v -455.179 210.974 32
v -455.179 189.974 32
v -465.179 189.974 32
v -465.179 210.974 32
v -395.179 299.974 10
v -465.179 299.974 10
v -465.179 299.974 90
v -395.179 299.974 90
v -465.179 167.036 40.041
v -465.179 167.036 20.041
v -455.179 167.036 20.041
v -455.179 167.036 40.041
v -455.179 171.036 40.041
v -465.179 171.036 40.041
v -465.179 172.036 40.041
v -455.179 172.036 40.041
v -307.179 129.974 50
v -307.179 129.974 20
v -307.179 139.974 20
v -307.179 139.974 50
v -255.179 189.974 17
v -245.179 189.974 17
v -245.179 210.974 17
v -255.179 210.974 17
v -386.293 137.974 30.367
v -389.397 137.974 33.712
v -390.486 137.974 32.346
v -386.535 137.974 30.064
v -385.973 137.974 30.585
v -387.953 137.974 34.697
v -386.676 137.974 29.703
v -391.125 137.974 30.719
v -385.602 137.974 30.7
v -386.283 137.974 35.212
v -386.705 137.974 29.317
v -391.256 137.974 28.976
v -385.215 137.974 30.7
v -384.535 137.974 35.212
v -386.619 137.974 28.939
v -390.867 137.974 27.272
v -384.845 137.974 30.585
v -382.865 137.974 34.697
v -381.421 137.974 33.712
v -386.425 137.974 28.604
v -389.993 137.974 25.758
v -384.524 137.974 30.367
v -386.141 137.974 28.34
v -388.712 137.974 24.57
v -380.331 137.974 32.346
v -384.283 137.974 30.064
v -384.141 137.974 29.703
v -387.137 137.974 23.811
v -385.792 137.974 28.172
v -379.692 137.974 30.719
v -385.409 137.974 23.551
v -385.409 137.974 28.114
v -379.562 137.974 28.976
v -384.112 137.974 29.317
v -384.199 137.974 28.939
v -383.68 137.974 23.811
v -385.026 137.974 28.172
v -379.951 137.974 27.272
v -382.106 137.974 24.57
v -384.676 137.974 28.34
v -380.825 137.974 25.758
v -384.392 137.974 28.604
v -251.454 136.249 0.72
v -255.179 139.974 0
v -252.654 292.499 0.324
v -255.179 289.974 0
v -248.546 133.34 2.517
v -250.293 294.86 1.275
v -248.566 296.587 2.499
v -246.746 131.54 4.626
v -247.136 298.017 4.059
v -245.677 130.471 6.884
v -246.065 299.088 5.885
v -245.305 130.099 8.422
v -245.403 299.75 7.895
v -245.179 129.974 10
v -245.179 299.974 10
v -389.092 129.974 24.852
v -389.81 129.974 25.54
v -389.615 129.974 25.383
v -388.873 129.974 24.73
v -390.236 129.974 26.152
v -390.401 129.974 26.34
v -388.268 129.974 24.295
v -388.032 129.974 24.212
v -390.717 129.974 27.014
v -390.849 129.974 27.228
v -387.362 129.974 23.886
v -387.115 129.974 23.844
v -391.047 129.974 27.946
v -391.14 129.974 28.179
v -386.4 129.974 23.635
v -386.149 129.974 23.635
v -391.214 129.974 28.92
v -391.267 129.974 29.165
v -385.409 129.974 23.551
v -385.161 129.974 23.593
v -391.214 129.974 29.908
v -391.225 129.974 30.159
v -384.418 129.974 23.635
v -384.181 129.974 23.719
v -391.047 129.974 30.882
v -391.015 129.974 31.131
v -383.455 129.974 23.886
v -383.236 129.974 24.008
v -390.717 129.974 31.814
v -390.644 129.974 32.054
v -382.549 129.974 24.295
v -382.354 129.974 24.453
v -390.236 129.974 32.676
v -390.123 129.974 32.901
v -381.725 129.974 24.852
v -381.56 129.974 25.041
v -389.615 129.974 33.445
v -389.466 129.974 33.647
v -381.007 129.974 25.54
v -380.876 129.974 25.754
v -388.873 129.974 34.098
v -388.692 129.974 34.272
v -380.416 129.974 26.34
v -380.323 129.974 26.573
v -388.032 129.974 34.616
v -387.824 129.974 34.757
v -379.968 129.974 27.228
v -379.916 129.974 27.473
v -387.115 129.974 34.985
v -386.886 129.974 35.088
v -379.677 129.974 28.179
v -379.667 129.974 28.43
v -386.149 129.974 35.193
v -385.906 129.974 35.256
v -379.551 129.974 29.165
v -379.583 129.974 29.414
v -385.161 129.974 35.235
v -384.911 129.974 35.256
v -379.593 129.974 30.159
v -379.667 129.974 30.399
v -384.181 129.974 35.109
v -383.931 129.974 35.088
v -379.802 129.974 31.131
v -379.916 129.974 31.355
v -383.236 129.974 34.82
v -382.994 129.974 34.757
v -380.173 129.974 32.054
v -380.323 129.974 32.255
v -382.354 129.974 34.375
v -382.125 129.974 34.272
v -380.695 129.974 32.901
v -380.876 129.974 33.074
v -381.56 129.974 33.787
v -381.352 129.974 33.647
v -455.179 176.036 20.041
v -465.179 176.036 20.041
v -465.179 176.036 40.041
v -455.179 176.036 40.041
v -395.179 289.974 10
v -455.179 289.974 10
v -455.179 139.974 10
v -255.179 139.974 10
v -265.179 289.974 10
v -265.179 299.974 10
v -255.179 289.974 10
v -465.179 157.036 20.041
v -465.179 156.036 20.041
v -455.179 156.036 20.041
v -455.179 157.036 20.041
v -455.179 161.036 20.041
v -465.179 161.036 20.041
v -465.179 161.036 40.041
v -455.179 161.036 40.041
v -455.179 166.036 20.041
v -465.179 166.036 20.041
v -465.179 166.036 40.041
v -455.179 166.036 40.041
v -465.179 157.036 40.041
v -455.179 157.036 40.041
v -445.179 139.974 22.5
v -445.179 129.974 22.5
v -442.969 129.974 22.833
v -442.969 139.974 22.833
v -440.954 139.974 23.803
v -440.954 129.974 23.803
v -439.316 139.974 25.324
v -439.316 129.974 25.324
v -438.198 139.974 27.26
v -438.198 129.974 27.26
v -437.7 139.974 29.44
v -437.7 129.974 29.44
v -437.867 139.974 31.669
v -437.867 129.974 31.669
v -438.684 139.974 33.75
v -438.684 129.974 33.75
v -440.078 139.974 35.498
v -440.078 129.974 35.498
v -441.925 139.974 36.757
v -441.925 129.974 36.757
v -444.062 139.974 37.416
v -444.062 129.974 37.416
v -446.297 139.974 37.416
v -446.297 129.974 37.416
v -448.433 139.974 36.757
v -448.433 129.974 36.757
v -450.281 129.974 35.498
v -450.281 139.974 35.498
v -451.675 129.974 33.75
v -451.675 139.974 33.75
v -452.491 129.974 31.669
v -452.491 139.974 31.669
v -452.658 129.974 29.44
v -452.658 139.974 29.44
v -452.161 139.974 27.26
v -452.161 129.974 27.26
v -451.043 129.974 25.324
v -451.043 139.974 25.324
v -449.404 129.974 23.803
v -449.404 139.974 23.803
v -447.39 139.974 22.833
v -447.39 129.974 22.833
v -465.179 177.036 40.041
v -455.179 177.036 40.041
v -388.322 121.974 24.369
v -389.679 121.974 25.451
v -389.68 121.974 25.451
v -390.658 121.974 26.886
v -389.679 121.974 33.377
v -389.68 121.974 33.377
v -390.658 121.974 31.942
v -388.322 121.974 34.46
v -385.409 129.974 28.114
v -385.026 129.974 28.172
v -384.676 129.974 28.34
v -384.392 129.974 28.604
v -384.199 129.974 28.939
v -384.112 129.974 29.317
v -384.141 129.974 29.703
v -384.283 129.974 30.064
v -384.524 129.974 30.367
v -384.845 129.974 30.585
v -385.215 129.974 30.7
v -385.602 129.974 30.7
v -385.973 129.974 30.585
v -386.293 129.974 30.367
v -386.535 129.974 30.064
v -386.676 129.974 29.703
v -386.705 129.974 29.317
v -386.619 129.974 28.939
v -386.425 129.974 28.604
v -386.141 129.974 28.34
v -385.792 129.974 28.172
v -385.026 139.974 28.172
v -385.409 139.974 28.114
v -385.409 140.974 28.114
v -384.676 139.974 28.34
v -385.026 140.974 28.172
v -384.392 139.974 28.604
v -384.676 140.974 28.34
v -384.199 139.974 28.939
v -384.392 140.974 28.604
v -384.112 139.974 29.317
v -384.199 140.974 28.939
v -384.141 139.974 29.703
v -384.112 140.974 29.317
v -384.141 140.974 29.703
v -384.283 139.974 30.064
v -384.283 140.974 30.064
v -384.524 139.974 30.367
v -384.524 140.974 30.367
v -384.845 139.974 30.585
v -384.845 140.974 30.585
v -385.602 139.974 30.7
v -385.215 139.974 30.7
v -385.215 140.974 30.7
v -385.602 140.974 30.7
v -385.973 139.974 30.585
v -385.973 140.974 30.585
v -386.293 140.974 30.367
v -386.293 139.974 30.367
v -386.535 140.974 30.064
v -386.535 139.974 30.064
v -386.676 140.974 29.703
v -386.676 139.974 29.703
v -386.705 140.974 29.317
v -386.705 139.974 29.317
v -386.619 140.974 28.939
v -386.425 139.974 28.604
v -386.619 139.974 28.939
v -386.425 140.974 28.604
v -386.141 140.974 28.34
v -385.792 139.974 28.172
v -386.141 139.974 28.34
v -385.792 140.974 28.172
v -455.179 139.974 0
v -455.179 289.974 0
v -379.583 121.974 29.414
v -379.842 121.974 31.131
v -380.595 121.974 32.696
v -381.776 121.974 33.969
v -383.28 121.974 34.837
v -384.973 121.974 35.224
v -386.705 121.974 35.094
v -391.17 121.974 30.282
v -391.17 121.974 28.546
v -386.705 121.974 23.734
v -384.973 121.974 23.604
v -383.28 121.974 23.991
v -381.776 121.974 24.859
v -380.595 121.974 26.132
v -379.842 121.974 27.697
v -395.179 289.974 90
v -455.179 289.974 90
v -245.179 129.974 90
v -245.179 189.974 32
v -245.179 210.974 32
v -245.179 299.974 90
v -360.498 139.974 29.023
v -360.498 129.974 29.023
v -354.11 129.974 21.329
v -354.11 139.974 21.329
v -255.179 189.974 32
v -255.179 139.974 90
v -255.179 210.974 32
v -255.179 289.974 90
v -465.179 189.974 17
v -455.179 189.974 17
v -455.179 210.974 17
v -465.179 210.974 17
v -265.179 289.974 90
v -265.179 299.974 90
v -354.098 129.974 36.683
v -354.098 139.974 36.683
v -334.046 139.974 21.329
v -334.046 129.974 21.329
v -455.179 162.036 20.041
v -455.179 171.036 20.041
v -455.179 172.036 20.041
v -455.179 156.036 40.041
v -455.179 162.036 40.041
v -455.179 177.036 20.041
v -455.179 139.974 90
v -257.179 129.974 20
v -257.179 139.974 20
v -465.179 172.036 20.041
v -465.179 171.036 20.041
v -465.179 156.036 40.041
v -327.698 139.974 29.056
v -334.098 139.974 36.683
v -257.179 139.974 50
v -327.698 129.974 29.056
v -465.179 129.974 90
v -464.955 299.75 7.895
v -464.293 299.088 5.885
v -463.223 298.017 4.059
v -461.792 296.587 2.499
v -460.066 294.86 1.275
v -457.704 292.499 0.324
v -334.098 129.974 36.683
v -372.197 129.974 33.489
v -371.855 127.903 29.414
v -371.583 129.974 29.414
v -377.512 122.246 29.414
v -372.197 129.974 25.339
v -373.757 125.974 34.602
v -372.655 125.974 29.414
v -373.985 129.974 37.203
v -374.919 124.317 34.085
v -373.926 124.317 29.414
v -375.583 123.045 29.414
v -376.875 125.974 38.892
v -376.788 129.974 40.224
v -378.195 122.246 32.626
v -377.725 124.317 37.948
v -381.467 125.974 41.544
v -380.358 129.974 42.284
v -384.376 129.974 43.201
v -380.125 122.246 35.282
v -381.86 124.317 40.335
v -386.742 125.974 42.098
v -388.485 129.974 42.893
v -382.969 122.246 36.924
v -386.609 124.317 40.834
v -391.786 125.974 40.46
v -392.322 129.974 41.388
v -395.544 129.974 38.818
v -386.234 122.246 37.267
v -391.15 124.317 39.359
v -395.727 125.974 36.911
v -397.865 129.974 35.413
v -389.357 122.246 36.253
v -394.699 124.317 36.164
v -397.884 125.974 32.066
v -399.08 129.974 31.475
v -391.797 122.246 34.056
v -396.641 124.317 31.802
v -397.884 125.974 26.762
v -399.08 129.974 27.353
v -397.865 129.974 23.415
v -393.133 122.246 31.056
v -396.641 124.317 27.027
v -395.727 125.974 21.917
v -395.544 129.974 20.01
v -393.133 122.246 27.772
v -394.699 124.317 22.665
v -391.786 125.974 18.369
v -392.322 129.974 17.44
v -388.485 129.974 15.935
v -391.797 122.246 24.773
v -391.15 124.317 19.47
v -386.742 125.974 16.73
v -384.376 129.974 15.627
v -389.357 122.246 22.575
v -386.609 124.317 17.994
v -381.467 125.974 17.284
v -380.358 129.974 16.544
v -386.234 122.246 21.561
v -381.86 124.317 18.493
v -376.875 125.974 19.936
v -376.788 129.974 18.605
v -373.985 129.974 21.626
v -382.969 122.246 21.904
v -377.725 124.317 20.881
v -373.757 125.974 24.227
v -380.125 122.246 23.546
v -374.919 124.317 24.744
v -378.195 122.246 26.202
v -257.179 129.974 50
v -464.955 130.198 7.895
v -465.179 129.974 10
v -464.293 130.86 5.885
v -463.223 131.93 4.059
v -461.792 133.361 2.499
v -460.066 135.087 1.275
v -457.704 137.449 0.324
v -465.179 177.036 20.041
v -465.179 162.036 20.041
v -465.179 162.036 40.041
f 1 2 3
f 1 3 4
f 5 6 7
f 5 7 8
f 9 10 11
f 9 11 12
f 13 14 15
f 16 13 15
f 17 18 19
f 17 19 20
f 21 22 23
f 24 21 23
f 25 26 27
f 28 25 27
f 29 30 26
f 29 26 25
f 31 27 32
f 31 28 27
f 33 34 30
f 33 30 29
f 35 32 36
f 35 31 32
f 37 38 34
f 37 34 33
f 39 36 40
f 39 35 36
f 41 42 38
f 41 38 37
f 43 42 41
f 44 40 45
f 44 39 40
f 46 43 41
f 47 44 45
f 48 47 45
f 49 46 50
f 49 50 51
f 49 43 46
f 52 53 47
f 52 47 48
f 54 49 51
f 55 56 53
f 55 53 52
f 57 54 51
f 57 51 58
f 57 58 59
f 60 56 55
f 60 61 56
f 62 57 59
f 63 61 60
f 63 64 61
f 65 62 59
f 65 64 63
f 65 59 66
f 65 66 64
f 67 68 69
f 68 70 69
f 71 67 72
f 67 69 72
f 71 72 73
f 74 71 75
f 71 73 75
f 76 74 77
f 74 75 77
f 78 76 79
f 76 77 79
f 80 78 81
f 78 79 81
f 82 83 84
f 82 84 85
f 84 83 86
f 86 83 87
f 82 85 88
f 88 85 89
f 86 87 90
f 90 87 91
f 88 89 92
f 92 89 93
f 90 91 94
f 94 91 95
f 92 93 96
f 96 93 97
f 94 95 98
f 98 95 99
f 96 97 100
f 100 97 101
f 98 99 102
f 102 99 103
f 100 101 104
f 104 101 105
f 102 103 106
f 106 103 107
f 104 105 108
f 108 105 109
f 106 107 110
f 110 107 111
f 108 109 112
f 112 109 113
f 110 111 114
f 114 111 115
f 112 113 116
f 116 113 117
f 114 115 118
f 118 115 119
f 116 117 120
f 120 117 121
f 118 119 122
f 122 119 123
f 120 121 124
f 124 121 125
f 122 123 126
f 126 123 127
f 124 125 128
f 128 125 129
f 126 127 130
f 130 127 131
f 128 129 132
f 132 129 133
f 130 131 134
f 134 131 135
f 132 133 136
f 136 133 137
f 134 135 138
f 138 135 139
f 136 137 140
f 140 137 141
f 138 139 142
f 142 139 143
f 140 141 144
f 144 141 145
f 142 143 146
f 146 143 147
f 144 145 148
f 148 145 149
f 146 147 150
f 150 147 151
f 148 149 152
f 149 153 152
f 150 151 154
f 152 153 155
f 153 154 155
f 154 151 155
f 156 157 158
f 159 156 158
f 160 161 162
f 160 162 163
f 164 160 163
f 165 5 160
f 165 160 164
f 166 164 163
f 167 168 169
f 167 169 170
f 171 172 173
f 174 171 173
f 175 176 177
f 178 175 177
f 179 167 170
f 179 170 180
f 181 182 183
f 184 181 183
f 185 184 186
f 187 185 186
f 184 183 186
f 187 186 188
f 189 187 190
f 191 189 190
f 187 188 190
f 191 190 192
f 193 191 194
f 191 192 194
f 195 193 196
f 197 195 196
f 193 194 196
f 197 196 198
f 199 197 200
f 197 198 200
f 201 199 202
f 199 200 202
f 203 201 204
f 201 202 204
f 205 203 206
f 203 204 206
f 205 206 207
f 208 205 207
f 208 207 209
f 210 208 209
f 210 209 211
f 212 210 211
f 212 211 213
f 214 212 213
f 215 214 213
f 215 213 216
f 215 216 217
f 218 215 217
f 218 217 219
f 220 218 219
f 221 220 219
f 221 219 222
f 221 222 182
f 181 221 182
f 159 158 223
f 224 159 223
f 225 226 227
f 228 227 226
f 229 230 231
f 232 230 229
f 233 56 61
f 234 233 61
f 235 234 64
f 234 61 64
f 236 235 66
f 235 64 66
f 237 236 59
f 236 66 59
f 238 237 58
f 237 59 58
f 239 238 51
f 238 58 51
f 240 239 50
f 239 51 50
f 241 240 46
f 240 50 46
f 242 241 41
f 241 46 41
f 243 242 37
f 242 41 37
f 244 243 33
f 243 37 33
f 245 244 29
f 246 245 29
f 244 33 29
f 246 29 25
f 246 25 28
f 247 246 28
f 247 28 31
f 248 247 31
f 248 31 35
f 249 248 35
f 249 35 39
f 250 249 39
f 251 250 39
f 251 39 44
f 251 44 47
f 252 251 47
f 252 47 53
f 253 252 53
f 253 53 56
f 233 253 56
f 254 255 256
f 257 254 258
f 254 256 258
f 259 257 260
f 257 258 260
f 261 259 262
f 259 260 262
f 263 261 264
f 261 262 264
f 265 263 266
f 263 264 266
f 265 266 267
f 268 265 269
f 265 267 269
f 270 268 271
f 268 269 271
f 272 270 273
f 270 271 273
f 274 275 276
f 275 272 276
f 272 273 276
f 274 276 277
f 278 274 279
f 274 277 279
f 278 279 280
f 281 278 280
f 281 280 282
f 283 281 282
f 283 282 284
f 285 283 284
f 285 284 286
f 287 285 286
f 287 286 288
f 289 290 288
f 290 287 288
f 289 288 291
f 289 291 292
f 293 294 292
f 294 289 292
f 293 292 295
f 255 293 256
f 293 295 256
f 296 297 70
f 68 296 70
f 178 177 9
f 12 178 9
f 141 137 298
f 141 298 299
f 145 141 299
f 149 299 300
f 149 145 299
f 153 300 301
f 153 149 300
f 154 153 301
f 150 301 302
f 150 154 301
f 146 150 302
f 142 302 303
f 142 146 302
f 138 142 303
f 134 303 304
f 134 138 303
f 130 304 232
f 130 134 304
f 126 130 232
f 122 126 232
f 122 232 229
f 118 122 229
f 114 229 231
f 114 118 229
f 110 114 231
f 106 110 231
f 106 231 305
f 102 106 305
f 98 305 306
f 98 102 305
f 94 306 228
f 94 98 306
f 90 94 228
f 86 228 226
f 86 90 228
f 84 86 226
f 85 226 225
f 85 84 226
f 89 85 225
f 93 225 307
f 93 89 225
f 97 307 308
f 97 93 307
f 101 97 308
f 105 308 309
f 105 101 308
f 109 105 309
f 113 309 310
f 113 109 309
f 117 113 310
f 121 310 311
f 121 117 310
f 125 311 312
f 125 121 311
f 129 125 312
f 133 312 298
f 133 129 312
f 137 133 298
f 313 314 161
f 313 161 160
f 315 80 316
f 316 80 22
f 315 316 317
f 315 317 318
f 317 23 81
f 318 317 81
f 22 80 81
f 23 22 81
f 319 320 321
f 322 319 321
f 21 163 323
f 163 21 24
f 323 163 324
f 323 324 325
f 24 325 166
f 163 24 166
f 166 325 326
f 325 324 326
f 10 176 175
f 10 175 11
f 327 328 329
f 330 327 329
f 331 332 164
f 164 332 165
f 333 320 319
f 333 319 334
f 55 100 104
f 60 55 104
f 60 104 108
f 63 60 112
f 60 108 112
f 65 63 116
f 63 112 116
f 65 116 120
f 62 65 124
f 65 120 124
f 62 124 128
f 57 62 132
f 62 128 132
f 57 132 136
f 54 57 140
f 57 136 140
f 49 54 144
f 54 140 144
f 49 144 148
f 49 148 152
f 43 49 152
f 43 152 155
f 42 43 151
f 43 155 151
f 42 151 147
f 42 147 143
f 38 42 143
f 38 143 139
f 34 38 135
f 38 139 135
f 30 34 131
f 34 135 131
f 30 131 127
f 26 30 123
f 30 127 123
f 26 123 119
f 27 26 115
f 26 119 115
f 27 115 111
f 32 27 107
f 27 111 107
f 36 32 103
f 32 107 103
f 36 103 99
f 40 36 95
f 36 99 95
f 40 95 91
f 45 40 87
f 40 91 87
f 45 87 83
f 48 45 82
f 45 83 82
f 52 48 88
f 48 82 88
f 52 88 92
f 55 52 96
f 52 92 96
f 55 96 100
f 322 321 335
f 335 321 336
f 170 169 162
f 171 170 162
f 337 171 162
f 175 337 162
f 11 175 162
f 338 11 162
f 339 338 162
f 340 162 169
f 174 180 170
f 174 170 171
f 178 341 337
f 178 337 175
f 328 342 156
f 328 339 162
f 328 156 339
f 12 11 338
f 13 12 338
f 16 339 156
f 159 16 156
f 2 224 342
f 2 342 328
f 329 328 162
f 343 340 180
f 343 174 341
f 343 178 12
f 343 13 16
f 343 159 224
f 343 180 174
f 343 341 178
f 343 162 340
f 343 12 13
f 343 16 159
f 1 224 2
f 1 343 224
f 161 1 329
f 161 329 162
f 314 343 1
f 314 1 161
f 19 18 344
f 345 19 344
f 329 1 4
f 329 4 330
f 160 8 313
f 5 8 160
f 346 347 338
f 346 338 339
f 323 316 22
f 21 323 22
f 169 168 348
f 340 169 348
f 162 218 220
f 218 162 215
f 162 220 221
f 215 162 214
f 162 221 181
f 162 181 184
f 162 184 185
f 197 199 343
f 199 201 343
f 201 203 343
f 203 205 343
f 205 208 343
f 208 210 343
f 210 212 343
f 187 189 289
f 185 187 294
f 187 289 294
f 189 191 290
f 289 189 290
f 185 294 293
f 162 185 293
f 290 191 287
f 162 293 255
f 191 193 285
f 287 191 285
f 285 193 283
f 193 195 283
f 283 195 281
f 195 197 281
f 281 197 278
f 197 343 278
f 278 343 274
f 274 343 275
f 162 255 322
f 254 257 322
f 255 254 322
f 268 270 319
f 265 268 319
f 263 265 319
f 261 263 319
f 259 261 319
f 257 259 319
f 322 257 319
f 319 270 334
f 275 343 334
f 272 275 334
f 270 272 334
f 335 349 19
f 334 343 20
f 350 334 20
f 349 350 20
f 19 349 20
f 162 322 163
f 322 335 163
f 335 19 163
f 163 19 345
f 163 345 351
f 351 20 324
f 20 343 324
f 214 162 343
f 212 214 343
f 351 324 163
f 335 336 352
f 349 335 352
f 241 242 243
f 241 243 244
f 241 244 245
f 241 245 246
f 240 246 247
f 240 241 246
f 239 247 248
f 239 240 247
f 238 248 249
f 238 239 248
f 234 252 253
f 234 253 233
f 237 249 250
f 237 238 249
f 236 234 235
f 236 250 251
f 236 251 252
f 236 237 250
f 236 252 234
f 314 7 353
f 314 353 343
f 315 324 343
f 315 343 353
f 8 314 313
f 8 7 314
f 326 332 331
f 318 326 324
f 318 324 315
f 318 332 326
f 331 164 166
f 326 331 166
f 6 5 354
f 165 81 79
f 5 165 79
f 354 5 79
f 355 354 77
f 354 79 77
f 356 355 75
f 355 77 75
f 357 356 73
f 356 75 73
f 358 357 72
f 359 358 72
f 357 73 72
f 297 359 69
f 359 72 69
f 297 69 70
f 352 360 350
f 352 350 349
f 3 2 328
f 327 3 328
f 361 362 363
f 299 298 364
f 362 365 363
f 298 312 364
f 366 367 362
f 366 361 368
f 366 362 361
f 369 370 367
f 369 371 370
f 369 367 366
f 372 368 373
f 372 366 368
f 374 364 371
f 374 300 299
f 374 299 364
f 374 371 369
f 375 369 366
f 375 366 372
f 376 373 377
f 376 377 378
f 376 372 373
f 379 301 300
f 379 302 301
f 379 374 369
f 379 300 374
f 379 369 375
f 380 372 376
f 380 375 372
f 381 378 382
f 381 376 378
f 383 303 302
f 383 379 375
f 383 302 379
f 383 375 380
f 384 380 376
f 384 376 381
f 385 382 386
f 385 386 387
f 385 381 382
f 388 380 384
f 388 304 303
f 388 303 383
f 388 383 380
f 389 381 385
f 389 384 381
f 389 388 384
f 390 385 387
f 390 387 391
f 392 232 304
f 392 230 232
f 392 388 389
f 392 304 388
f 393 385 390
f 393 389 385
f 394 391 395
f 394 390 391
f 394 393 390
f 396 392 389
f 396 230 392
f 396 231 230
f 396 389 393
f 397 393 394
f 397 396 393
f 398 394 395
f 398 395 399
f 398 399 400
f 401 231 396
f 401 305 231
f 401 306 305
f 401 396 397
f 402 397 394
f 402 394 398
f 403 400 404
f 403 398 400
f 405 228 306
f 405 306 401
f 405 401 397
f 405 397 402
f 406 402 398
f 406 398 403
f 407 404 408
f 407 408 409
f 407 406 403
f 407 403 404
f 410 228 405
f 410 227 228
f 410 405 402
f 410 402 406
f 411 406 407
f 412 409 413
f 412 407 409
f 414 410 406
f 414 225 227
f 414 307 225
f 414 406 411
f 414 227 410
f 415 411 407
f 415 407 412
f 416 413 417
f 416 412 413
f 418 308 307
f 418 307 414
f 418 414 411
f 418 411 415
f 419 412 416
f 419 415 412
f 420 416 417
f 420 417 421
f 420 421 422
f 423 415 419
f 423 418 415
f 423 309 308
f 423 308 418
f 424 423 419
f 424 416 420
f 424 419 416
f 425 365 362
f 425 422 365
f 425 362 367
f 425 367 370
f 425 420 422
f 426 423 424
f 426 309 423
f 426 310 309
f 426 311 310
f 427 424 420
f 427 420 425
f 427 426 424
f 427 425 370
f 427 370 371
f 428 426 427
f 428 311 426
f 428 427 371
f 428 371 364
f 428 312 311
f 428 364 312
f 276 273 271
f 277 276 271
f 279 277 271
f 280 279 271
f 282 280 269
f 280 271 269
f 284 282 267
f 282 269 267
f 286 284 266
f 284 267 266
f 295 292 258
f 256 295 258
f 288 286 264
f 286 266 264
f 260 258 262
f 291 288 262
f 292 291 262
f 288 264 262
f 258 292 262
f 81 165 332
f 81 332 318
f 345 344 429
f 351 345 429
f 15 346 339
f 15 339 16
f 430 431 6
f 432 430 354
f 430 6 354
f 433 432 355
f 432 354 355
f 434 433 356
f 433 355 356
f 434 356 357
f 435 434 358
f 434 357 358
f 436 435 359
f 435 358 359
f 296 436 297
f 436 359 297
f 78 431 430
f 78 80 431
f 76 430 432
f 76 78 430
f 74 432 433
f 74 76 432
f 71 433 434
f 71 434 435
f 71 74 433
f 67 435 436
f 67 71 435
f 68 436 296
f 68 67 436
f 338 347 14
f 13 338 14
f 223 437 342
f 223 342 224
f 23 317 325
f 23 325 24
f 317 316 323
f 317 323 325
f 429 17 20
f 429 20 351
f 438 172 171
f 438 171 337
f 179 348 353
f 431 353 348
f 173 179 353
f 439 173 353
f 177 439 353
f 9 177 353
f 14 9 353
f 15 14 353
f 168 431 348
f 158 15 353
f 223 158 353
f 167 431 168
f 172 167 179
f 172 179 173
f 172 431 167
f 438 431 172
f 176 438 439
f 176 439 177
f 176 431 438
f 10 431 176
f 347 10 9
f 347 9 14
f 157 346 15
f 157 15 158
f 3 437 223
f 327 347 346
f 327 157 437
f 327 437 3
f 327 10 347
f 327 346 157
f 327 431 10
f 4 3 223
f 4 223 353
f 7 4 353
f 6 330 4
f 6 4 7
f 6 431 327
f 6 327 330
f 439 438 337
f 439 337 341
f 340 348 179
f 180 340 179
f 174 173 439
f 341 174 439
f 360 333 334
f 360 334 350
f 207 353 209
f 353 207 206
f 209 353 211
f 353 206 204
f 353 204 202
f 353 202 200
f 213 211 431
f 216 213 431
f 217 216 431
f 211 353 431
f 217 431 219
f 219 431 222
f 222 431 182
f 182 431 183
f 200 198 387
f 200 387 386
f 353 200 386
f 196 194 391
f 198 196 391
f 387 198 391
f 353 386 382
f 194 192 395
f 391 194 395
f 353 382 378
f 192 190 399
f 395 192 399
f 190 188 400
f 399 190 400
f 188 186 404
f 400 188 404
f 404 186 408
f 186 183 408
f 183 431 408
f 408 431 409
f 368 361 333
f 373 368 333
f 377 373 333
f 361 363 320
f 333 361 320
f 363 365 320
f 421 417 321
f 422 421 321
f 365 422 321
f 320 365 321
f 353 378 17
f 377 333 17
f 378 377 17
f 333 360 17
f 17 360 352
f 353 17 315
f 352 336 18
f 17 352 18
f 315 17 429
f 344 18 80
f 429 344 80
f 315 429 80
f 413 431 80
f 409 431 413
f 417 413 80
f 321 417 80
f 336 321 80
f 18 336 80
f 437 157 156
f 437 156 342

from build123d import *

# Parameters (mm, degrees)
SKETCH1_W                = 220
SKETCH1_H                = 170
BOSS_EXTRUDE1_DEPTH      = 100
SKETCH3_W                = 200
SKETCH3_H                = 150
CUT_EXTRUDE2_DEPTH       = 90
FILLET1_R                = 10
SKETCH4_W                = 130
SKETCH4_H                = 90
CUT_EXTRUDE3_DEPTH       = 10
SKETCH8_W                = 223.528125383
SKETCH8_H                = 171.877504909
CUT_EXTRUDE5_DEPTH       = 10
CUT_EXTRUDE7_REACH       = 505.38
SKETCH9_R                = 7.5
CUT_EXTRUDE8_REACH       = 505.38
SKETCH10_W               = 50
SKETCH10_H               = 30
CUT_EXTRUDE9_REACH       = 384.733
SKETCH11_W               = 20
SKETCH11_H               = 1
CUT_EXTRUDE10_REACH      = 505.38
CUT_EXTRUDE11_DEPTH      = 10
CUT_EXTRUDE12_REACH      = 505.38
SKETCH15_R               = 5.863278905
CUT_EXTRUDE13_DEPTH      = 8
BOSS_EXTRUDE3_DEPTH      = 8
BOSS_EXTRUDE3_DEPTH_BACK = 3
SKETCH16_R               = 1.3
SKETCH17_R               = 13.825952239
SKETCH17_R_2             = 5.825952239
EXTRUDE_THIN1_DEPTH      = 8
FILLET2_R                = 8
SKETCH18_W               = 15
SKETCH18_H               = 21
CUT_EXTRUDE14_DEPTH      = 249


with BuildPart() as part:
    # Sketch1 → Boss-Extrude1 (new body)
    with BuildSketch(Plane.XY):
        with Locations((-355.179344655, 214.973620006)):
            Rectangle(SKETCH1_W, SKETCH1_H)
    extrude(amount=BOSS_EXTRUDE1_DEPTH)

    # Sketch3 → Cut-Extrude2 (cut)
    with BuildSketch(Plane.XY.offset(100)):
        with Locations((-355.179344655, 214.973620006)):
            Rectangle(SKETCH3_W, SKETCH3_H)
    extrude(amount=-CUT_EXTRUDE2_DEPTH, mode=Mode.SUBTRACT)

    # Fillet1
    fillet1_edges = [part.edges().sort_by_distance(p)[0] for p in [
        (-355.179344655, 299.973620006, 0),
        (-245.179344655, 214.973620006, 0),
        (-355.179344655, 129.973620006, 0),
        (-465.179344655, 214.973620006, 0),
    ]]
    fillet(fillet1_edges, radius=FILLET1_R)

    # Sketch4 → Cut-Extrude3 (cut)
    with BuildSketch(Plane(origin=(0, 299.973620006, 0), x_dir=(1, 0, 0), z_dir=(0, 1, 0))):
        with Locations((-330.179344655, -55)):
            Rectangle(SKETCH4_W, SKETCH4_H)
    extrude(amount=-CUT_EXTRUDE3_DEPTH, mode=Mode.SUBTRACT)

    # Sketch8 → Cut-Extrude5 (cut)
    with BuildSketch(Plane.XY.offset(90)):
        with Locations((-354.80209528, 215.143634814)):
            Rectangle(SKETCH8_W, SKETCH8_H)
    extrude(amount=CUT_EXTRUDE5_DEPTH, mode=Mode.SUBTRACT)

    # Sketch9 → Cut-Extrude7 (cut, up to next)
    with BuildSketch(Plane.XZ.offset(-129.973620006), mode=Mode.PRIVATE) as cut_extrude7_sk1:
        with Locations(Location((-445.179344655, 30, 0), (0, 0, 270))):
            Circle(SKETCH9_R)
    cut_extrude7_tool1 = extrude(cut_extrude7_sk1.sketch, amount=-CUT_EXTRUDE7_REACH, mode=Mode.PRIVATE) & part.part
    add(cut_extrude7_tool1.solids().sort_by_distance((-445.179345, 129.97362, 30))[0], mode=Mode.SUBTRACT)

    # Sketch10 → Cut-Extrude8 (cut, up to next)
    with BuildSketch(Plane.XZ.offset(-129.973620006), mode=Mode.PRIVATE) as cut_extrude8_sk1:
        with Locations((-282.179344655, 35)):
            Rectangle(SKETCH10_W, SKETCH10_H)
    cut_extrude8_tool1 = extrude(cut_extrude8_sk1.sketch, amount=-CUT_EXTRUDE8_REACH, mode=Mode.PRIVATE) & part.part
    add(cut_extrude8_tool1.solids().sort_by_distance((-282.179345, 129.97362, 35))[0], mode=Mode.SUBTRACT)

    # Sketch11 → Cut-Extrude9 (cut, up to next)
    with BuildSketch(Plane.ZY.offset(465.179344655), mode=Mode.PRIVATE) as cut_extrude9_sk1:
        with Locations((30.04058668, 161.535899553)):
            Rectangle(SKETCH11_W, SKETCH11_H)
    cut_extrude9_tool1 = extrude(cut_extrude9_sk1.sketch, amount=-CUT_EXTRUDE9_REACH, mode=Mode.PRIVATE) & part.part
    # Sketch11 → Cut-Extrude9 (cut, up to next)
    with BuildSketch(Plane.ZY.offset(465.179344655), mode=Mode.PRIVATE) as cut_extrude9_sk2:
        with Locations((30.04058668, 156.535899553)):
            Rectangle(SKETCH11_W, SKETCH11_H)
    cut_extrude9_tool2 = extrude(cut_extrude9_sk2.sketch, amount=-CUT_EXTRUDE9_REACH, mode=Mode.PRIVATE) & part.part
    # Sketch11 → Cut-Extrude9 (cut, up to next)
    with BuildSketch(Plane.ZY.offset(465.179344655), mode=Mode.PRIVATE) as cut_extrude9_sk3:
        with Locations((30.04058668, 166.535899553)):
            Rectangle(SKETCH11_W, SKETCH11_H)
    cut_extrude9_tool3 = extrude(cut_extrude9_sk3.sketch, amount=-CUT_EXTRUDE9_REACH, mode=Mode.PRIVATE) & part.part
    # Sketch11 → Cut-Extrude9 (cut, up to next)
    with BuildSketch(Plane.ZY.offset(465.179344655), mode=Mode.PRIVATE) as cut_extrude9_sk4:
        with Locations((30.04058668, 171.535899553)):
            Rectangle(SKETCH11_W, SKETCH11_H)
    cut_extrude9_tool4 = extrude(cut_extrude9_sk4.sketch, amount=-CUT_EXTRUDE9_REACH, mode=Mode.PRIVATE) & part.part
    # Sketch11 → Cut-Extrude9 (cut, up to next)
    with BuildSketch(Plane.ZY.offset(465.179344655), mode=Mode.PRIVATE) as cut_extrude9_sk5:
        with Locations((30.04058668, 176.535899553)):
            Rectangle(SKETCH11_W, SKETCH11_H)
    cut_extrude9_tool5 = extrude(cut_extrude9_sk5.sketch, amount=-CUT_EXTRUDE9_REACH, mode=Mode.PRIVATE) & part.part
    add(cut_extrude9_tool1.solids().sort_by_distance((-465.179345, 161.5359, 30.040587))[0], mode=Mode.SUBTRACT)
    add(cut_extrude9_tool2.solids().sort_by_distance((-465.179345, 156.5359, 30.040587))[0], mode=Mode.SUBTRACT)
    add(cut_extrude9_tool3.solids().sort_by_distance((-465.179345, 166.5359, 30.040587))[0], mode=Mode.SUBTRACT)
    add(cut_extrude9_tool4.solids().sort_by_distance((-465.179345, 171.5359, 30.040587))[0], mode=Mode.SUBTRACT)
    add(cut_extrude9_tool5.solids().sort_by_distance((-465.179345, 176.5359, 30.040587))[0], mode=Mode.SUBTRACT)

    # Sketch12 → Cut-Extrude10 (cut, up to next)
    with BuildSketch(Plane.XZ.offset(-129.973620006), mode=Mode.PRIVATE) as cut_extrude10_sk1:
        Polygon((-354.097719845, 36.683084204), (-334.097719845, 36.683084204), (-327.697719845, 29.055861211), (-335.358164277, 22.627985114), (-352.790666107, 22.627985114), (-360.497719845, 29.023338287), align=None)
    cut_extrude10_tool1 = extrude(cut_extrude10_sk1.sketch, amount=-CUT_EXTRUDE10_REACH, mode=Mode.PRIVATE) & part.part
    add(cut_extrude10_tool1.solids().sort_by_distance((-344.093749, 129.97362, 29.715571))[0], mode=Mode.SUBTRACT)

    # Sketch13 → Cut-Extrude11 (cut)
    with BuildSketch(Plane.XZ.offset(-129.973620006)):
        Polygon((-360.497719845, 29.023338287), (-354.110242897, 21.329175679), (-354.11397805, 22.529175679), (-354.117713203, 23.729175679), align=None)
        Polygon((-334.045816465, 21.329175679), (-327.697719845, 29.055861211), (-334.045816465, 23.729175679), (-334.045816465, 22.627985114), align=None)
    extrude(amount=-CUT_EXTRUDE11_DEPTH, mode=Mode.SUBTRACT)

    # Sketch14 → Cut-Extrude12 (cut, up to next)
    with BuildSketch(Plane.XZ.offset(-129.973620006), mode=Mode.PRIVATE) as cut_extrude12_sk1:
        Polygon((-354.117713203, 23.729175679), (-354.110242897, 21.329175679), (-334.045816465, 21.329175679), (-334.045816465, 23.729175679), align=None)
    cut_extrude12_tool1 = extrude(cut_extrude12_sk1.sketch, amount=-CUT_EXTRUDE12_REACH, mode=Mode.PRIVATE) & part.part
    add(cut_extrude12_tool1.solids().sort_by_distance((-344.079897, 129.97362, 22.52925))[0], mode=Mode.SUBTRACT)

    # Sketch15 → Cut-Extrude13 (cut)
    with BuildSketch(Plane.XZ.offset(-129.973620006)):
        with Locations(Location((-385.408718364, 29.414099171, 0), (0, 0, 270))):
            Circle(SKETCH15_R)
    extrude(amount=-CUT_EXTRUDE13_DEPTH, mode=Mode.SUBTRACT)

    # Sketch16 → Boss-Extrude3 (add, two sides: drawn at the far end of the back side and taken through both)
    with BuildSketch(Plane.XZ.offset(-137.973620006).offset(-BOSS_EXTRUDE3_DEPTH_BACK)):
        with Locations(Location((-385.408718364, 29.414099171, 0), (0, 0, 270))):
            Circle(SKETCH16_R)
    extrude(amount=BOSS_EXTRUDE3_DEPTH + BOSS_EXTRUDE3_DEPTH_BACK)

    # Sketch17 → Extrude-Thin1 (add)
    with BuildSketch(Plane.XZ.offset(-129.973620006)):
        with Locations((-385.408718364, 29.414099171)):
            Circle(SKETCH17_R)
        with Locations((-385.408718364, 29.414099171)):
            Circle(SKETCH17_R_2, mode=Mode.SUBTRACT)
    extrude(amount=EXTRUDE_THIN1_DEPTH)

    # Fillet2
    fillet2_edges = [part.edges().sort_by_distance(p)[0] for p in [
        (-399.234670603, 121.973620006, 29.414099171),
    ]]
    fillet(fillet2_edges, radius=FILLET2_R - 0.0001)  # a hair under: the kernel refuses the full size

    # Sketch18 → Cut-Extrude14 (cut)
    with BuildSketch(Plane(origin=(-245.179344655, 0, 0), x_dir=(0, 0, -1), z_dir=(1, 0, 0))):
        with Locations((-24.5, 200.473620006)):
            Rectangle(SKETCH18_W, SKETCH18_H)
    extrude(amount=-CUT_EXTRUDE14_DEPTH, mode=Mode.SUBTRACT)


solid = part.part
